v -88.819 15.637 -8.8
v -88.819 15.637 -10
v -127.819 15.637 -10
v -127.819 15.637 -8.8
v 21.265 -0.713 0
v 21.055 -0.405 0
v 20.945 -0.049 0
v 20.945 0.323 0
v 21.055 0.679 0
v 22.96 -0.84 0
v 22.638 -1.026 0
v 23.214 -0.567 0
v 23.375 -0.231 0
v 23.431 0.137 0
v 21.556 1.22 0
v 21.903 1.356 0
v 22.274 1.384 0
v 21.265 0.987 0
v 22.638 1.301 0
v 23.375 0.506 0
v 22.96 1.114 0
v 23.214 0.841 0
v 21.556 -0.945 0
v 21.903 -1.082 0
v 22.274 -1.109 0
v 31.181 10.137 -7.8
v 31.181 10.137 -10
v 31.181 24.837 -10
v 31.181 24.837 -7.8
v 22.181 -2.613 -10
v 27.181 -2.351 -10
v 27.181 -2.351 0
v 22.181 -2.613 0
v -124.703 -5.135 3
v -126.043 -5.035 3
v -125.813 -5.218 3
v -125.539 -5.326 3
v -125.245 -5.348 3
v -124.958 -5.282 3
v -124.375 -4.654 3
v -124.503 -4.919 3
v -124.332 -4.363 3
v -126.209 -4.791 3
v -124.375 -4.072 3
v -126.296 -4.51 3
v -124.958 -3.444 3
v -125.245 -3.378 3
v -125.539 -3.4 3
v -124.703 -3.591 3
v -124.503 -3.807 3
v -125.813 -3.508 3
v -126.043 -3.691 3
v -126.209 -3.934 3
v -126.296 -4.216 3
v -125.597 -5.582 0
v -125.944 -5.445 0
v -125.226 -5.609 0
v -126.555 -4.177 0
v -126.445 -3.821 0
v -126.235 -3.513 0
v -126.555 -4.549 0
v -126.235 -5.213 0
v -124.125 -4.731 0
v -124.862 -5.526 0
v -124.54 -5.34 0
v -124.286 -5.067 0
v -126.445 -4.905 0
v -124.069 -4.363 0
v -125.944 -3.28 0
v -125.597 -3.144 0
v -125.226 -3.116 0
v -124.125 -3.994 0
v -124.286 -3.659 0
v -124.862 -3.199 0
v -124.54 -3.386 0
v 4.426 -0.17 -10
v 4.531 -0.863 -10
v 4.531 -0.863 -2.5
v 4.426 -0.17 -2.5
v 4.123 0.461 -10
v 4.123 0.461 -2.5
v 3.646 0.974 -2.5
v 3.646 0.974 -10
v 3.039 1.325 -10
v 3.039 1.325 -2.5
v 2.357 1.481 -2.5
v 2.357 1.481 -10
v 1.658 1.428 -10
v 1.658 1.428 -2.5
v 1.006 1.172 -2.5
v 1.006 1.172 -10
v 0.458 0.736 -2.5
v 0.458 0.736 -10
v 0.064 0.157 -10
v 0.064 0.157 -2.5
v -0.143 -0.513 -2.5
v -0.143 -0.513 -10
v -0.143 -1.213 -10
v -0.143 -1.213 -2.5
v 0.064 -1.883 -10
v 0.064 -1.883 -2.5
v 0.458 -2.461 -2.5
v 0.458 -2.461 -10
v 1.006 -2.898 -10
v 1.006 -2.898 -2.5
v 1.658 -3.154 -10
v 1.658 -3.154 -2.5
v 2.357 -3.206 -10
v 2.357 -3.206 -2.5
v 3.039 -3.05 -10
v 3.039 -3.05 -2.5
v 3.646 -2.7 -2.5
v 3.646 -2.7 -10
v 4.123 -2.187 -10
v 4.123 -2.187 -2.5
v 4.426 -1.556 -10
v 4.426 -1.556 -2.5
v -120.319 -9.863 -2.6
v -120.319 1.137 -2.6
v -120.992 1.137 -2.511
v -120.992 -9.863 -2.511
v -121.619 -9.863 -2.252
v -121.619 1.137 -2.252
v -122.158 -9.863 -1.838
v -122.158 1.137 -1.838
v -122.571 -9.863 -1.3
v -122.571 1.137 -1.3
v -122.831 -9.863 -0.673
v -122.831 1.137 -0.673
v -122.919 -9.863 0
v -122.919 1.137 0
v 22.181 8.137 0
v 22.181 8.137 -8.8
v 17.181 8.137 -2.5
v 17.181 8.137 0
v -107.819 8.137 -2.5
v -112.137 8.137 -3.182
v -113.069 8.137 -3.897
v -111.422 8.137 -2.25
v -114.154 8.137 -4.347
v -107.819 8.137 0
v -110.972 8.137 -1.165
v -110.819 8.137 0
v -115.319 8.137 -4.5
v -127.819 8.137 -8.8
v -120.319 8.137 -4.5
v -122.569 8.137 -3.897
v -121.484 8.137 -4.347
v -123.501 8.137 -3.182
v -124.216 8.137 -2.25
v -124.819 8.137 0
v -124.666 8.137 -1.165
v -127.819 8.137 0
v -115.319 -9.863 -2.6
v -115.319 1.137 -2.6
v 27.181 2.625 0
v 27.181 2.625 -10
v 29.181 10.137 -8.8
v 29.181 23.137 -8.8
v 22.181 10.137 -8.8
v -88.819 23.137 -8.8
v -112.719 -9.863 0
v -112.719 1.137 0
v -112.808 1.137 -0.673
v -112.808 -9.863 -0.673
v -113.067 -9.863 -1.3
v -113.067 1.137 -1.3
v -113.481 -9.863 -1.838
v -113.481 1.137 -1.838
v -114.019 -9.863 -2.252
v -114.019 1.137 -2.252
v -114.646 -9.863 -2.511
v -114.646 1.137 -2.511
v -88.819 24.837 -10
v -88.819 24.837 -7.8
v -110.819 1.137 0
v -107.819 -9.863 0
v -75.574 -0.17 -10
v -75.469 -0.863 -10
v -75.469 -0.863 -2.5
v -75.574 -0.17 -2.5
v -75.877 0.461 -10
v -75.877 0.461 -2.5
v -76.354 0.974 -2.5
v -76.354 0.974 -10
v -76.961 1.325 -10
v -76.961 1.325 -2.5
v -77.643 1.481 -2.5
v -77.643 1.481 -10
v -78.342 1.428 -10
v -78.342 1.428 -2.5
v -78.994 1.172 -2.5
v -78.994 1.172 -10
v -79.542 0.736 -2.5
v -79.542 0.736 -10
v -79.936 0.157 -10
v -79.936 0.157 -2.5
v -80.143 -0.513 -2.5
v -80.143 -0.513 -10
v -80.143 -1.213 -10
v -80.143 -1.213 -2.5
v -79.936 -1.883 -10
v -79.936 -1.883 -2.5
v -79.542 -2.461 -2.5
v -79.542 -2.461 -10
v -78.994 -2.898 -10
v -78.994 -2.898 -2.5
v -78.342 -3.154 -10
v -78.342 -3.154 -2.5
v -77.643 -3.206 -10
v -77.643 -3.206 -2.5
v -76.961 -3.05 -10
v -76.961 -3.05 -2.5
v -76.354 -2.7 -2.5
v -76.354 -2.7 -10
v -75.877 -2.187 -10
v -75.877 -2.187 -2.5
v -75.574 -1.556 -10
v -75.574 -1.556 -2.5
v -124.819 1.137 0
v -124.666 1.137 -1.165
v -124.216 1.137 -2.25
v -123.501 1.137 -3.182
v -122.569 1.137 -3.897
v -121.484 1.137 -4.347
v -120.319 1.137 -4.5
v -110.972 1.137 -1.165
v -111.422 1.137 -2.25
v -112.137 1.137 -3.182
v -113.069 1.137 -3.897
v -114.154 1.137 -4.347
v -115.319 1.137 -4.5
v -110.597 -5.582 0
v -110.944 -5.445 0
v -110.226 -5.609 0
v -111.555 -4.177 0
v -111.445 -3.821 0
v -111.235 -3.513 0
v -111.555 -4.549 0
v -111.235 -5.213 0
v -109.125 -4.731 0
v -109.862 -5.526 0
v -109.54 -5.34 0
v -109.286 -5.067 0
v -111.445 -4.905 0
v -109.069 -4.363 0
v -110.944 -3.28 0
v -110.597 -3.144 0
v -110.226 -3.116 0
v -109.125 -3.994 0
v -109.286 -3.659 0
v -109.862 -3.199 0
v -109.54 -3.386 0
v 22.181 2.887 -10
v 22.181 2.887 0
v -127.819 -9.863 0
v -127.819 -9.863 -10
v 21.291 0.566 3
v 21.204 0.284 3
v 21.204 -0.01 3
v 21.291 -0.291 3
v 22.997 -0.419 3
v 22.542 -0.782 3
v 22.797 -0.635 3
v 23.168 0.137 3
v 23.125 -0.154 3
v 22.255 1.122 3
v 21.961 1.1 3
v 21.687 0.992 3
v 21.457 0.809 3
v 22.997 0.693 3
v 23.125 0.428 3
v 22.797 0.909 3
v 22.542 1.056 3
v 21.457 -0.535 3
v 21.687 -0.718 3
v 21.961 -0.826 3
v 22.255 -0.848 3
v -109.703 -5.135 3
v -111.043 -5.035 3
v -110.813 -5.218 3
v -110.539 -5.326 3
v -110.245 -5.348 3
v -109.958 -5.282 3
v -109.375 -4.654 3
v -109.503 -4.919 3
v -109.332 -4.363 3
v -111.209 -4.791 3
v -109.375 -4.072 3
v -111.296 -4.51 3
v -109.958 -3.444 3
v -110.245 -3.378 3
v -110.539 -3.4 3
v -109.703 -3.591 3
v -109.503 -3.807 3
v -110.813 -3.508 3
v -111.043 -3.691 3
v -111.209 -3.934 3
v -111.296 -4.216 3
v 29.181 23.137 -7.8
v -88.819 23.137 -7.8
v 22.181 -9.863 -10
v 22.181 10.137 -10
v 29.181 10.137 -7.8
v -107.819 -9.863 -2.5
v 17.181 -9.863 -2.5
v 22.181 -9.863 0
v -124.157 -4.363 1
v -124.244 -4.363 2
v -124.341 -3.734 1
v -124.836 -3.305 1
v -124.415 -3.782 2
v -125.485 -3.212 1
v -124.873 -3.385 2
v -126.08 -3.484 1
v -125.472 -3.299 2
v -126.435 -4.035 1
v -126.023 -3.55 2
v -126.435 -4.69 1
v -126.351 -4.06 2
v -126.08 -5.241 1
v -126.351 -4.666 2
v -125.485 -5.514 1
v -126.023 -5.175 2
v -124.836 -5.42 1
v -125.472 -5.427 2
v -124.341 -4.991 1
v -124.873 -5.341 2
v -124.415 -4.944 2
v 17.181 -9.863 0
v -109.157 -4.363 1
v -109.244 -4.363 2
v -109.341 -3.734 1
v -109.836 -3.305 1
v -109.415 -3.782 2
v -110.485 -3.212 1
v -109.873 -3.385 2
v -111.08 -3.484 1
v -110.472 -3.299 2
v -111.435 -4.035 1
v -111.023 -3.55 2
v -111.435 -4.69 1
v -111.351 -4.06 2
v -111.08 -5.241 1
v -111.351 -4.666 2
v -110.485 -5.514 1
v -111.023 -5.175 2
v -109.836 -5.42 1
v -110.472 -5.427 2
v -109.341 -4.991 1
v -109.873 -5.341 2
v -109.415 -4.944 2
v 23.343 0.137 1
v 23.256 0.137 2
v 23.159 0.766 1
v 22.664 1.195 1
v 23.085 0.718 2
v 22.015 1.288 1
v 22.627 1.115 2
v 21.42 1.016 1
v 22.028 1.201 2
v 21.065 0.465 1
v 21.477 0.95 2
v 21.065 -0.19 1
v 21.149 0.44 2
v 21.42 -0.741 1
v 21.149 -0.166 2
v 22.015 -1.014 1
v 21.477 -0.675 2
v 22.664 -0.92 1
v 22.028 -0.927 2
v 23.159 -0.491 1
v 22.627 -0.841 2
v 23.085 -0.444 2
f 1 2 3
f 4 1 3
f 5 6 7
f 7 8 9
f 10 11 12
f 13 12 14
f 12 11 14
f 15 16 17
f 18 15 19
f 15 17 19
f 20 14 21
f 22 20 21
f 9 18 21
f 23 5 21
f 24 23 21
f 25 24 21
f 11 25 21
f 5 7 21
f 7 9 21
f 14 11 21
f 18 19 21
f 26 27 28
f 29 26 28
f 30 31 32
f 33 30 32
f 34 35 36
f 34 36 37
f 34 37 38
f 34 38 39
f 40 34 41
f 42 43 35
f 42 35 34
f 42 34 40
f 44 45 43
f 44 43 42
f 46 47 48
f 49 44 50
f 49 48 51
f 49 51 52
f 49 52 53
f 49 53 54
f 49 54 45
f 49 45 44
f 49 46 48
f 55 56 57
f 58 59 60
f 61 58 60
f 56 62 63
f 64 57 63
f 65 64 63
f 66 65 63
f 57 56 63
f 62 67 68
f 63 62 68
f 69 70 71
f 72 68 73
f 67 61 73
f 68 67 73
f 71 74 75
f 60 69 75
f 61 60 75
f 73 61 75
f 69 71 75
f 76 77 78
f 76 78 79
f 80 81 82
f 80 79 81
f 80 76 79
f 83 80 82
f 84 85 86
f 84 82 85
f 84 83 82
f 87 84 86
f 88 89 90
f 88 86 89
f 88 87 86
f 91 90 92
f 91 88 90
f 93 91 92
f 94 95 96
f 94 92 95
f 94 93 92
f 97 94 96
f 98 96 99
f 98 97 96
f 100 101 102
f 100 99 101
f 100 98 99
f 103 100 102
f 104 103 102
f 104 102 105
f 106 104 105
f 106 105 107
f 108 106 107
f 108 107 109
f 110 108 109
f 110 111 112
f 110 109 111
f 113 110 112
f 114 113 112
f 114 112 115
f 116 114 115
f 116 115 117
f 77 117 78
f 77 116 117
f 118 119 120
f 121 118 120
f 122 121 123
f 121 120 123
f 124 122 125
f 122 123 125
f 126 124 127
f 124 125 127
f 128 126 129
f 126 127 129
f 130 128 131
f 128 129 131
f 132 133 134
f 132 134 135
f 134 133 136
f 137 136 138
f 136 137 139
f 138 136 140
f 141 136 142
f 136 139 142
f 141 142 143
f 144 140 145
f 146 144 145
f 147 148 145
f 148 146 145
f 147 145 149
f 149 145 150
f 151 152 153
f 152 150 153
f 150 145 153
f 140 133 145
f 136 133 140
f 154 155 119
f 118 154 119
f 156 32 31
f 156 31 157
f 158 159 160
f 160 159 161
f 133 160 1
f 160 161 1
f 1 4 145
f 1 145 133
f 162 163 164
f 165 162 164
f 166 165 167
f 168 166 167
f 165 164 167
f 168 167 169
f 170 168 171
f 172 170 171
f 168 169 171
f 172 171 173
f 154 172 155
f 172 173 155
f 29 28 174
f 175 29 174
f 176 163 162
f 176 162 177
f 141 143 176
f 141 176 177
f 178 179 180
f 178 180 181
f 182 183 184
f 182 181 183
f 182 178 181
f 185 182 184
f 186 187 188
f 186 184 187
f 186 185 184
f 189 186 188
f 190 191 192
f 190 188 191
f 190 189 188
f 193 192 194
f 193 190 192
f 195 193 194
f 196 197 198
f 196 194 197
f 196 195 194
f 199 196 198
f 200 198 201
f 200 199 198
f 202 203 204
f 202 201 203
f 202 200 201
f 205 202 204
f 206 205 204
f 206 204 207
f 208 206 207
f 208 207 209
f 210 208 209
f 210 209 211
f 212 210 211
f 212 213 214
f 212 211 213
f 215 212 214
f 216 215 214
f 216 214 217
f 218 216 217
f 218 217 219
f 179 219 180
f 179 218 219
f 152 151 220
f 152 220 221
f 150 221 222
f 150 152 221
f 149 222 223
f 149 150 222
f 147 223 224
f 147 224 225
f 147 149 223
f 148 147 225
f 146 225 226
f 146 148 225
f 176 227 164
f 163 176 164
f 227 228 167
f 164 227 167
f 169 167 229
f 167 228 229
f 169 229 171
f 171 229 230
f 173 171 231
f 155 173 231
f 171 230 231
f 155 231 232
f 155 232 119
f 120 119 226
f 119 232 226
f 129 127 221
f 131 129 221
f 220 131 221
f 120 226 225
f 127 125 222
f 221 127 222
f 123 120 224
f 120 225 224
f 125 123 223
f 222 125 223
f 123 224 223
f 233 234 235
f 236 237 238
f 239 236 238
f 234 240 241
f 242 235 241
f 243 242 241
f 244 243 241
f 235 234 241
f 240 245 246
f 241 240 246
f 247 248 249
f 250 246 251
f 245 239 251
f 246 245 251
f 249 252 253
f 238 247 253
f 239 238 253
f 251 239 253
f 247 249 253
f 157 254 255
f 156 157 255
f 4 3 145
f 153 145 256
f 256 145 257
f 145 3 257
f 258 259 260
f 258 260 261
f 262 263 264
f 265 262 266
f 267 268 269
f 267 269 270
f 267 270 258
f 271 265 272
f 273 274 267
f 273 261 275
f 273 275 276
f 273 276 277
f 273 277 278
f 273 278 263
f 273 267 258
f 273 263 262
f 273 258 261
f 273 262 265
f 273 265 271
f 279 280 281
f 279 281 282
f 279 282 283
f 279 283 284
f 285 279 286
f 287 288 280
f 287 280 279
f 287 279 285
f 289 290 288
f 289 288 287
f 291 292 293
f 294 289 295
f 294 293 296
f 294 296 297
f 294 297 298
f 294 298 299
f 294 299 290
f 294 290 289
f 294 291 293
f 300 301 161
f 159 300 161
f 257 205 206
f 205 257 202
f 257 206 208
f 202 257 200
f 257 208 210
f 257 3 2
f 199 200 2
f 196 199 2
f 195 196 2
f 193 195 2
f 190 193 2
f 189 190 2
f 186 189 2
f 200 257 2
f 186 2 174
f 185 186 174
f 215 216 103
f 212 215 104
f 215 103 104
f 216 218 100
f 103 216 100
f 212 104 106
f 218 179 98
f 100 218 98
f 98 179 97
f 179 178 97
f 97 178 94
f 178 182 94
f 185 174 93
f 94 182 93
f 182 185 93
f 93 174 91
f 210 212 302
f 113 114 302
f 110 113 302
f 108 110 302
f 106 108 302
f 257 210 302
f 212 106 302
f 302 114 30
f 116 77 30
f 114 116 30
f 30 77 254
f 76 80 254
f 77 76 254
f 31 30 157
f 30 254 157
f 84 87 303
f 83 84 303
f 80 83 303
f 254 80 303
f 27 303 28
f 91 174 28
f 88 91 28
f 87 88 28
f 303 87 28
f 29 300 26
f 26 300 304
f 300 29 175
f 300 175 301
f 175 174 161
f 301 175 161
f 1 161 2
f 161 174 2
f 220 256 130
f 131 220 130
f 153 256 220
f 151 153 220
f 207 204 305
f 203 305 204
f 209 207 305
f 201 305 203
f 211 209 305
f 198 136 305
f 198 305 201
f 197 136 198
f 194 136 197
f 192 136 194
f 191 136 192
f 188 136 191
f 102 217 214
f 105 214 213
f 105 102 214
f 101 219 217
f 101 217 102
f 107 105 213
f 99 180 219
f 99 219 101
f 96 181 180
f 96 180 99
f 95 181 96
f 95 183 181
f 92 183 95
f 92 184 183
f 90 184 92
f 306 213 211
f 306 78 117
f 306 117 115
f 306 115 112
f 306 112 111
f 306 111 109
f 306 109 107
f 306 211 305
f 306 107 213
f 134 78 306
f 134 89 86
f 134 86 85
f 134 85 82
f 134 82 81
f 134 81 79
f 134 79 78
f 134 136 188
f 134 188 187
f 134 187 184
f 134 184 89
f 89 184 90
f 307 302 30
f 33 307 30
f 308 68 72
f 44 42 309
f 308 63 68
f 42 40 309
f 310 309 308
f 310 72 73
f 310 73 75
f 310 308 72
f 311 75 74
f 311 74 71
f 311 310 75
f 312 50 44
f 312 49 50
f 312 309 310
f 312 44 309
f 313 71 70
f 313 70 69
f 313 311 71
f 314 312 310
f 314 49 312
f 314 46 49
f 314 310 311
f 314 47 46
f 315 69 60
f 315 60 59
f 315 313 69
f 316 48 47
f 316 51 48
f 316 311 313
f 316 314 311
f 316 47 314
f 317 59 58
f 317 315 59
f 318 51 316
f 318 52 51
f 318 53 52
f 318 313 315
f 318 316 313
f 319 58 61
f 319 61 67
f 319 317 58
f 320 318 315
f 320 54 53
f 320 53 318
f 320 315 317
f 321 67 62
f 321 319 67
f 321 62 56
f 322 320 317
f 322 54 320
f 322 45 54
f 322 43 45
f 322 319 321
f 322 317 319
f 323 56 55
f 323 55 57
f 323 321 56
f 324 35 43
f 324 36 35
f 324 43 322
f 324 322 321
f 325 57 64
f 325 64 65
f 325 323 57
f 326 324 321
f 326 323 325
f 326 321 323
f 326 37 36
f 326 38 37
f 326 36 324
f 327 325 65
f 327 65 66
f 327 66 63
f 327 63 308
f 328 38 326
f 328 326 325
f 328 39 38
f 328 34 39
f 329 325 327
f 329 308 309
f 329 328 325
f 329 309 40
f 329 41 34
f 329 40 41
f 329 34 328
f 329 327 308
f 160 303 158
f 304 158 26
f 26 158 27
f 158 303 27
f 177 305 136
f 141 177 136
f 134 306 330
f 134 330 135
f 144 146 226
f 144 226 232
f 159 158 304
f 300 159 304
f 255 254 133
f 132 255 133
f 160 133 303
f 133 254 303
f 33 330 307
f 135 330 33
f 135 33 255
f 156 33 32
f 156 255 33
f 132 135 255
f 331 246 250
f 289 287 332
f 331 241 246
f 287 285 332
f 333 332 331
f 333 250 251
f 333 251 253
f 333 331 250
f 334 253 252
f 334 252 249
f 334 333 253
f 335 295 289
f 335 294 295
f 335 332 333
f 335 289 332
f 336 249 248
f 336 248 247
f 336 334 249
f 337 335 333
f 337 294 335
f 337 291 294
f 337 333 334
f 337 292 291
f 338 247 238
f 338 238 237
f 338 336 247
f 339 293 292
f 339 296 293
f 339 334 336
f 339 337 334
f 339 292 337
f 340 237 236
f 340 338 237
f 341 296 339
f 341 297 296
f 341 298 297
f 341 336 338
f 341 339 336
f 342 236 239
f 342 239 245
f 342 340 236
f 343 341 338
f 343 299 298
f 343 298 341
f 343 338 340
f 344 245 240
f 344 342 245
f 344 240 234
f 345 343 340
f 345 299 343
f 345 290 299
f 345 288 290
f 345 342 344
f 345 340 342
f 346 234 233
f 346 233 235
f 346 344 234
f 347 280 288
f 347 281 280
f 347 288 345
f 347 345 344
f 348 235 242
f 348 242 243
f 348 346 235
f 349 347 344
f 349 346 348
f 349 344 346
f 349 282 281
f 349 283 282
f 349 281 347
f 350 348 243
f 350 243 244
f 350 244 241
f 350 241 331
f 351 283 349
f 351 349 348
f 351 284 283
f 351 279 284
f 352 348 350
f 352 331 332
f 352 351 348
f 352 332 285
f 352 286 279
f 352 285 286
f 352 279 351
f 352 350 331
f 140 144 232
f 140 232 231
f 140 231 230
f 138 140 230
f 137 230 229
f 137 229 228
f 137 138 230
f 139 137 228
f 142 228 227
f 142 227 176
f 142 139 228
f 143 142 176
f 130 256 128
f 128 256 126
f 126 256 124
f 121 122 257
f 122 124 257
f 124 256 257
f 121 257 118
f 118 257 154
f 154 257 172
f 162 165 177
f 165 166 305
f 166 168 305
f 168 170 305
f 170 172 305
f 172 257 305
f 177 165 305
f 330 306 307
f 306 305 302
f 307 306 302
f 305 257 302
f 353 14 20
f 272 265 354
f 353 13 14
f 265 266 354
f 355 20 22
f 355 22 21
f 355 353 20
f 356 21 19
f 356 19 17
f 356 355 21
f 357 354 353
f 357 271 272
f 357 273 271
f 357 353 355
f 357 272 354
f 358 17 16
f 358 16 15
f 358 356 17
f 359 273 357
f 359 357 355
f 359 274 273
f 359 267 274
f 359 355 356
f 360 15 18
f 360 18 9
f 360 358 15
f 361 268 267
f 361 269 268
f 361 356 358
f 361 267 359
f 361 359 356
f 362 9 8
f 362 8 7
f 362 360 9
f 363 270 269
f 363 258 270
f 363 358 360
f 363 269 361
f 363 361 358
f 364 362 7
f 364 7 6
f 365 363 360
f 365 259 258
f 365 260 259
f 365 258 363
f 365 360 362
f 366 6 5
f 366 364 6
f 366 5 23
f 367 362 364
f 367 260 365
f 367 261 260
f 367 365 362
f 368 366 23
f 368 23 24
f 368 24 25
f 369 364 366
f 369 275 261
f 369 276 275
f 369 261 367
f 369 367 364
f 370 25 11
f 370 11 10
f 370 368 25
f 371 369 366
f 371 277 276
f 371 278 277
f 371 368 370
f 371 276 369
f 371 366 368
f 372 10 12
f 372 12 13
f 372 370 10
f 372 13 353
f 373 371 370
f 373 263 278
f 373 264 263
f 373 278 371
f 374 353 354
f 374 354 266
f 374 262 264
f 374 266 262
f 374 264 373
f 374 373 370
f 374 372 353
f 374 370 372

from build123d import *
from OCP.BRepFilletAPI import BRepFilletAPI_MakeChamfer

# Parameters (mm, degrees)
BOSS_EXTRUDE1_DEPTH      = 10
BOSS_EXTRUDE1_DEPTH_BACK = 10
CUT_EXTRUDE1_DEPTH       = 157
CUT_EXTRUDE4_DEPTH       = 2.5
CUT_EXTRUDE4_DEPTH_BACK  = 2.5
SKETCH8_W                = 125
SKETCH8_H                = 34.7
CUT_EXTRUDE5_DEPTH       = 131.593280003
CUT_EXTRUDE5_DEPTH_BACK  = 131.593280003
SKETCH9_R                = 2.35
CHAMFER2_SIZE            = 5
CHAMFER2_SIZE_2          = 0.262038896
CUT_EXTRUDE8_DEPTH       = 7
CUT_EXTRUDE9_DEPTH       = 131.381798599
SKETCH16_W               = 214.344642296
SKETCH16_H               = 84.645654919
CUT_EXTRUDE10_DEPTH      = 131.593280003
SKETCH17_W               = 2
SKETCH17_H               = 14.7
CUT_EXTRUDE11_DEPTH      = 7.8
SKETCH19_R               = 1.25
BOSS_EXTRUDE5_DEPTH      = 3
BOSS_EXTRUDE5_2_DEPTH    = 3
BOSS_EXTRUDE5_3_DEPTH    = 3
CHAMFER3_SIZE            = 3
CHAMFER3_SIZE_2          = 0.262465991
CHAMFER4_SIZE            = 3
CHAMFER4_SIZE_2          = 0.262465991
CHAMFER5_SIZE            = 3
CHAMFER5_SIZE_2          = 0.262465991


# Some blends are built 0.0001 mm under size
with BuildPart() as part:
    # Sketch1 → Boss-Extrude1 (new, two sides: drawn at the far end of the back side and taken through both)
    with BuildSketch(Plane.XY.offset(-BOSS_EXTRUDE1_DEPTH_BACK)):
        Polygon((-127.819104229, -9.862903226), (22.180895771, -9.862903226), (22.180895771, -2.612903226), (27.180895771, -2.612903226), (27.180895771, 2.887096774), (22.180895771, 2.887096774), (22.180895771, 10.137096774), (31.180895771, 10.137096774), (31.180895771, 23.637096774), (31.180895771, 24.837096774), (-88.819104229, 24.837096774), (-88.819104229, 23.637096774), (-88.819104229, 15.637096774), (-127.819104229, 15.637096774), align=None)
    extrude(amount=BOSS_EXTRUDE1_DEPTH + BOSS_EXTRUDE1_DEPTH_BACK)

    # Sketch2 → Cut-Extrude1 (cut)
    with BuildSketch(Plane.ZY.offset(127.819104229)):
        Polygon((-8.8, 23.137096774), (-8.8, 8.137096774), (8.8, 8.137096774), (8.8, 23.137096774), (7.8, 23.137096774), (7.8, 24.837096774), (-7.8, 24.837096774), (-7.8, 23.137096774), align=None)
    extrude(amount=-CUT_EXTRUDE1_DEPTH, mode=Mode.SUBTRACT)

    # Sketch8 → Cut-Extrude4 (cut, two sides: drawn at the far end of the back side and taken through both)
    with BuildSketch(Plane.XY.offset(-CUT_EXTRUDE4_DEPTH_BACK)):
        with Locations((-45.319104229, 7.487096774)):
            Rectangle(SKETCH8_W, SKETCH8_H)
    extrude(amount=CUT_EXTRUDE4_DEPTH + CUT_EXTRUDE4_DEPTH_BACK, mode=Mode.SUBTRACT)

    # Sketch9 → Cut-Extrude5 (cut, two sides: drawn at the far end of the back side and taken through both)
    with BuildSketch(Plane.XY.offset(-CUT_EXTRUDE5_DEPTH_BACK)):
        with Locations((-77.819104229, -0.862903226)):
            Circle(SKETCH9_R)
        with Locations((2.180895771, -0.862903226)):
            Circle(SKETCH9_R)
    extrude(amount=CUT_EXTRUDE5_DEPTH + CUT_EXTRUDE5_DEPTH_BACK, mode=Mode.SUBTRACT)

    # Chamfer2
    chamfer2_edges_1 = [part.edges().sort_by_distance(p)[0] for p in [
        (27.180895771, -2.612903226, 0),
    ]]
    chamfer2_side_1 = [part.faces().sort_by_distance(p)[0] for p in [
        (27.175654993, -2.612903226, 0),
    ]]
    chamfer2_edges_2 = [part.edges().sort_by_distance(p)[0] for p in [
        (27.180895771, 2.887096774, 0),
    ]]
    chamfer2_side_2 = [part.faces().sort_by_distance(p)[0] for p in [
        (27.180895771, 2.881855996, 0),
    ]]
    chamfer2 = BRepFilletAPI_MakeChamfer(part.part.solid().wrapped)
    for e in chamfer2_edges_1:
        chamfer2.Add(CHAMFER2_SIZE - 0.0001, CHAMFER2_SIZE_2 - 0.0001, e.wrapped, chamfer2_side_1[0].wrapped)
    for e in chamfer2_edges_2:
        chamfer2.Add(CHAMFER2_SIZE_2 - 0.0001, CHAMFER2_SIZE - 0.0001, e.wrapped, chamfer2_side_2[0].wrapped)
    add(Compound.cast(chamfer2.Shape()), mode=Mode.REPLACE)  # a hair under: the kernel refuses the full size

    # Sketch14 → Cut-Extrude8 (cut)
    with BuildSketch(Plane(origin=(0, 8.137096774, 0), x_dir=(1, 0, 0), z_dir=(0, 1, 0))):
        with BuildLine():
            Line((-120.319104229, 4.5), (-115.319104229, 4.5))
            ThreePointArc((-115.319104229, 4.5), (-110.819104229, 0), (-115.319104229, -4.5))
            Line((-115.319104229, -4.5), (-120.319104229, -4.5))
            ThreePointArc((-120.319104229, -4.5), (-124.819104229, 0), (-120.319104229, 4.5))
        make_face()
    extrude(amount=-CUT_EXTRUDE8_DEPTH, mode=Mode.SUBTRACT)

    # Sketch15 → Cut-Extrude9 (cut, through all)
    with BuildSketch(Plane(origin=(0, 1.137096774, 0), x_dir=(1, 0, 0), z_dir=(0, 1, 0))):
        with BuildLine():
            Line((-120.319104229, -2.6), (-115.319104229, -2.6))
            ThreePointArc((-115.319104229, -2.6), (-112.719104229, 0), (-115.319104229, 2.6))
            Line((-115.319104229, 2.6), (-120.319104229, 2.6))
            ThreePointArc((-120.319104229, 2.6), (-122.919104229, 0), (-120.319104229, -2.6))
        make_face()
    extrude(amount=-CUT_EXTRUDE9_DEPTH, mode=Mode.SUBTRACT)

    # Sketch16 → Cut-Extrude10 (cut, through all)
    with BuildSketch(Plane.XY):
        with Locations((-30.272765953, 16.776086779)):
            Rectangle(SKETCH16_W, SKETCH16_H)
    extrude(amount=CUT_EXTRUDE10_DEPTH, mode=Mode.SUBTRACT)

    # Sketch17 → Cut-Extrude11 (cut)
    with BuildSketch(Plane.XY):
        with Locations((30.180895771, 17.487096774)):
            Rectangle(SKETCH17_W, SKETCH17_H)
    extrude(amount=-CUT_EXTRUDE11_DEPTH, mode=Mode.SUBTRACT)


with BuildPart() as body_2:
    # Sketch19 → Boss-Extrude5 (new body)
    with BuildSketch(Plane.XY):
        with Locations((-125.319104229, -4.362903226)):
            Circle(SKETCH19_R)
    extrude(amount=BOSS_EXTRUDE5_DEPTH)

    # Chamfer5
    # the kernel refuses this chamfer: 3, 0.262465991 mm, written as the material it takes off along each edge
    with BuildSketch(Plane(origin=(-125.319104229, -4.362903226, 3), x_dir=(1, 0, 0), z_dir=(0, -1, 0))) as chamfer5_piece_1:
        Polygon((1.25, -CHAMFER5_SIZE), (1.25 - CHAMFER5_SIZE_2 * 0.999999998391, 0), (1.25, 0), align=None)
    revolve(axis=Axis((-125.319104229, -4.362903226, 3), (0, 0, 1)), mode=Mode.SUBTRACT)


with BuildPart() as body_3:
    # Sketch19 → Boss-Extrude5 2 (new body)
    with BuildSketch(Plane.XY):
        with Locations((-110.319104229, -4.362903226)):
            Circle(SKETCH19_R)
    extrude(amount=BOSS_EXTRUDE5_2_DEPTH)

    # Chamfer4
    # the kernel refuses this chamfer: 3, 0.262465991 mm, written as the material it takes off along each edge
    with BuildSketch(Plane(origin=(-110.319104229, -4.362903226, 3), x_dir=(1, 0, 0), z_dir=(0, -1, 0))) as chamfer4_piece_1:
        Polygon((1.25, -CHAMFER4_SIZE), (1.25 - CHAMFER4_SIZE_2 * 0.999999998391, 0), (1.25, 0), align=None)
    revolve(axis=Axis((-110.319104229, -4.362903226, 3), (0, 0, 1)), mode=Mode.SUBTRACT)


with BuildPart() as body_4:
    # Sketch19 → Boss-Extrude5 3 (new body)
    with BuildSketch(Plane.XY):
        with Locations((22.180895771, 0.137096774)):
            Circle(SKETCH19_R)
    extrude(amount=BOSS_EXTRUDE5_3_DEPTH)

    # Chamfer3
    # the kernel refuses this chamfer: 3, 0.262465991 mm, written as the material it takes off along each edge
    with BuildSketch(Plane(origin=(22.180895771, 0.137096774, 3), x_dir=(1, 0, 0), z_dir=(0, -1, 0))) as chamfer3_piece_1:
        Polygon((1.25, -CHAMFER3_SIZE), (1.25 - CHAMFER3_SIZE_2 * 0.999999998391, 0), (1.25, 0), align=None)
    revolve(axis=Axis((22.180895771, 0.137096774, 3), (0, 0, 1)), mode=Mode.SUBTRACT)


solid = Compound([part.part, body_2.part, body_3.part, body_4.part])
